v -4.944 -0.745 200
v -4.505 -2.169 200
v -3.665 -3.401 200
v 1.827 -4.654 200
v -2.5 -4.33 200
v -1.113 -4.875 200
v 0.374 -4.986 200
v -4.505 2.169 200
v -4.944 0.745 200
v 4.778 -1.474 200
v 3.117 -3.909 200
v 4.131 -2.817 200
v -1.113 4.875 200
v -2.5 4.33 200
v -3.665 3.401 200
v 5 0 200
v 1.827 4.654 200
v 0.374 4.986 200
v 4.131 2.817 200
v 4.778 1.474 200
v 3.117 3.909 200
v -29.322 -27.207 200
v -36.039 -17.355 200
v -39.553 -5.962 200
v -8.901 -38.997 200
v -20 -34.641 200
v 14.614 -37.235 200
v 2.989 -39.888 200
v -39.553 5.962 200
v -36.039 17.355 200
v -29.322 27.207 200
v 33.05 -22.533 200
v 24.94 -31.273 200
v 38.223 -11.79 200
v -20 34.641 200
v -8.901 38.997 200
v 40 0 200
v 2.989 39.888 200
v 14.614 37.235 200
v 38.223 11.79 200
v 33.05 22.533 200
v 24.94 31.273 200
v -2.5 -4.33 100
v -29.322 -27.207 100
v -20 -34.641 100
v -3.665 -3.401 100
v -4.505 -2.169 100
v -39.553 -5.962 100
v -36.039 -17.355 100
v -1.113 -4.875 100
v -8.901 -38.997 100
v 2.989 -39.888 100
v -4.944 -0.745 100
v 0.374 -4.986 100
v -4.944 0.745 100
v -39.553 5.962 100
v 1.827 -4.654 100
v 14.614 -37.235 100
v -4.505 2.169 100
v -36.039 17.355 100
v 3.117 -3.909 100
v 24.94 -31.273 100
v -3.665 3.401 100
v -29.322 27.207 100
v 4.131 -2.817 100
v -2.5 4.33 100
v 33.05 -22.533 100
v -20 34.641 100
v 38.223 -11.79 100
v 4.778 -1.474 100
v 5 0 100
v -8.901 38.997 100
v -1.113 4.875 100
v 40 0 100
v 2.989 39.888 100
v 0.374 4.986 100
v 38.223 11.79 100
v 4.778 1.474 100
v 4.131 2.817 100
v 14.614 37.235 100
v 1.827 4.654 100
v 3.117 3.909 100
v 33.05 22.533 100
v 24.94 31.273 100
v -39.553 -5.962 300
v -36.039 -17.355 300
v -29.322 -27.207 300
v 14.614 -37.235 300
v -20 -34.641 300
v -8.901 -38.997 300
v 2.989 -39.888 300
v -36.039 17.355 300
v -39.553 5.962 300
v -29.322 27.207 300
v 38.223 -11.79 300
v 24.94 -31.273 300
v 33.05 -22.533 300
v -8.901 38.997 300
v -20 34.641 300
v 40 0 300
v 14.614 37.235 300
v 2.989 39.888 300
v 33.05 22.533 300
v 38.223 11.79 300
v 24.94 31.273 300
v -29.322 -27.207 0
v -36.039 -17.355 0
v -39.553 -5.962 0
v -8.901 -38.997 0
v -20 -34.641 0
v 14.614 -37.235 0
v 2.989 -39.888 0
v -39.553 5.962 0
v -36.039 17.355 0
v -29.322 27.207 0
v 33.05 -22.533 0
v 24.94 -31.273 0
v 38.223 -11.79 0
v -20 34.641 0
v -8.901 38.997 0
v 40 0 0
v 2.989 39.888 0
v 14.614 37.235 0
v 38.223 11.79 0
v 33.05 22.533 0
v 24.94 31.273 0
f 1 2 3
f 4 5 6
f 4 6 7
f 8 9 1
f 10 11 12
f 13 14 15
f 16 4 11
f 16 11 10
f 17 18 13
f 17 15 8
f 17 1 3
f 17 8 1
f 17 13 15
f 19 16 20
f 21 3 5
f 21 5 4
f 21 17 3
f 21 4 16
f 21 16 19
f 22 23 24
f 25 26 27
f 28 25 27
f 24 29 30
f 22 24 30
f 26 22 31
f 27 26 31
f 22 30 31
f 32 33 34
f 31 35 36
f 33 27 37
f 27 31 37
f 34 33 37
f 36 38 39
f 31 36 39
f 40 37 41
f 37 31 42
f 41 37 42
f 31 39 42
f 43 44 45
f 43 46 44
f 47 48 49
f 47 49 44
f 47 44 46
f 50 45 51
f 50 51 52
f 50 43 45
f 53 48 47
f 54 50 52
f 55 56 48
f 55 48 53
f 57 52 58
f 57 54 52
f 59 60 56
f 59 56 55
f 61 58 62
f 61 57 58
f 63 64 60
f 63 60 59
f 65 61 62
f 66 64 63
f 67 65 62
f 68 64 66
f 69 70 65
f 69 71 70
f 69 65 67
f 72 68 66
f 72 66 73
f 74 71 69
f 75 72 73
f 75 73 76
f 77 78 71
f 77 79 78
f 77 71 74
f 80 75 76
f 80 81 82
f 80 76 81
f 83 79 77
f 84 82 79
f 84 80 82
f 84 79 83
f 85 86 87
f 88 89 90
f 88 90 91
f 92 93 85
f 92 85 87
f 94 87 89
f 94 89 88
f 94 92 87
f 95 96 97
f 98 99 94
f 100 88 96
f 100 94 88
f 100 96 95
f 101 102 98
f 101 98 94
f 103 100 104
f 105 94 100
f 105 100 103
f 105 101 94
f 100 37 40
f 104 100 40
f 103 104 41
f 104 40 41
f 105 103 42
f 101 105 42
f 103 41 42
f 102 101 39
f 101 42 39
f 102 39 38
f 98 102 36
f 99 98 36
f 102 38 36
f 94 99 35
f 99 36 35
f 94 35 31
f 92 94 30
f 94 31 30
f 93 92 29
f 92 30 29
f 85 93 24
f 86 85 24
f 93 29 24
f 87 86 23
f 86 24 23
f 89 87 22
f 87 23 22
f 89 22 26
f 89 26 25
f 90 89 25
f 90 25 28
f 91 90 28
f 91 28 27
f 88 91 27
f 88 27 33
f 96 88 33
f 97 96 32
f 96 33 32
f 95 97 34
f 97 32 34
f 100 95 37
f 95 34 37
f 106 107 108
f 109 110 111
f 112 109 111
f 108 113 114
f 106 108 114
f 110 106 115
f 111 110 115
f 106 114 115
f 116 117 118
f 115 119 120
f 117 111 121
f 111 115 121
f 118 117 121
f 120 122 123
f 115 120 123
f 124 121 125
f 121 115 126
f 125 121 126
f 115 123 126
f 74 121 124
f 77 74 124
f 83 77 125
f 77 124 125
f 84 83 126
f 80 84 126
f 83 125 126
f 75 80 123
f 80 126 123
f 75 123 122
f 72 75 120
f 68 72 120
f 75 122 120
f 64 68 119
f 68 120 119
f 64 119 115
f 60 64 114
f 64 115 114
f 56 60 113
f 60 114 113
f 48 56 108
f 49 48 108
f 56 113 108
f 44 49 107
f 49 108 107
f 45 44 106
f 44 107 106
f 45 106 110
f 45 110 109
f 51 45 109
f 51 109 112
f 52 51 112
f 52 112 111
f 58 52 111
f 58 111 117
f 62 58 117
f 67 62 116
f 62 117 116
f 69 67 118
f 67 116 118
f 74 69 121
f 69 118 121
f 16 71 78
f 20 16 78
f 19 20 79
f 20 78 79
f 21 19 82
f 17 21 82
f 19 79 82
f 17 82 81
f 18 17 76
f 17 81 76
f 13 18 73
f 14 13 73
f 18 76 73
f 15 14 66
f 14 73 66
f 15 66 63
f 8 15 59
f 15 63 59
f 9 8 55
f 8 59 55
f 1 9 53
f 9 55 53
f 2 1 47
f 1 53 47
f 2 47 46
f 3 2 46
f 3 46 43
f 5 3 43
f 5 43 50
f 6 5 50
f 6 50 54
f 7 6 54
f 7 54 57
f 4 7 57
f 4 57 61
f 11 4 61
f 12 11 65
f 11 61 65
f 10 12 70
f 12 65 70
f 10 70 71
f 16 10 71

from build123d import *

# Parameters (mm, degrees)
CYLINDER002_R     = 40
CYLINDER002_DEPTH = 100
CYLINDER001_R     = 5
CYLINDER001_DEPTH = 100
CYLINDER_R        = 40
CYLINDER_DEPTH    = 100


with BuildPart() as cylinder002:
    # Cylinder002 → Cylinder002 (new body)
    with BuildSketch(Plane.XY.offset(200)):
        Circle(CYLINDER002_R)
    extrude(amount=CYLINDER002_DEPTH)


with BuildPart() as cylinder001:
    # Cylinder001 → Cylinder001 (new body)
    with BuildSketch(Plane.XY.offset(100)):
        Circle(CYLINDER001_R)
    extrude(amount=CYLINDER001_DEPTH)


with BuildPart() as fusion:
    # Cylinder → Cylinder (new body)
    with BuildSketch(Plane.XY):
        Circle(CYLINDER_R)
    extrude(amount=CYLINDER_DEPTH)

    # Fusion: union Cylinder001
    add(cylinder001.part)


solid = Compound([cylinder002.part, fusion.part])
